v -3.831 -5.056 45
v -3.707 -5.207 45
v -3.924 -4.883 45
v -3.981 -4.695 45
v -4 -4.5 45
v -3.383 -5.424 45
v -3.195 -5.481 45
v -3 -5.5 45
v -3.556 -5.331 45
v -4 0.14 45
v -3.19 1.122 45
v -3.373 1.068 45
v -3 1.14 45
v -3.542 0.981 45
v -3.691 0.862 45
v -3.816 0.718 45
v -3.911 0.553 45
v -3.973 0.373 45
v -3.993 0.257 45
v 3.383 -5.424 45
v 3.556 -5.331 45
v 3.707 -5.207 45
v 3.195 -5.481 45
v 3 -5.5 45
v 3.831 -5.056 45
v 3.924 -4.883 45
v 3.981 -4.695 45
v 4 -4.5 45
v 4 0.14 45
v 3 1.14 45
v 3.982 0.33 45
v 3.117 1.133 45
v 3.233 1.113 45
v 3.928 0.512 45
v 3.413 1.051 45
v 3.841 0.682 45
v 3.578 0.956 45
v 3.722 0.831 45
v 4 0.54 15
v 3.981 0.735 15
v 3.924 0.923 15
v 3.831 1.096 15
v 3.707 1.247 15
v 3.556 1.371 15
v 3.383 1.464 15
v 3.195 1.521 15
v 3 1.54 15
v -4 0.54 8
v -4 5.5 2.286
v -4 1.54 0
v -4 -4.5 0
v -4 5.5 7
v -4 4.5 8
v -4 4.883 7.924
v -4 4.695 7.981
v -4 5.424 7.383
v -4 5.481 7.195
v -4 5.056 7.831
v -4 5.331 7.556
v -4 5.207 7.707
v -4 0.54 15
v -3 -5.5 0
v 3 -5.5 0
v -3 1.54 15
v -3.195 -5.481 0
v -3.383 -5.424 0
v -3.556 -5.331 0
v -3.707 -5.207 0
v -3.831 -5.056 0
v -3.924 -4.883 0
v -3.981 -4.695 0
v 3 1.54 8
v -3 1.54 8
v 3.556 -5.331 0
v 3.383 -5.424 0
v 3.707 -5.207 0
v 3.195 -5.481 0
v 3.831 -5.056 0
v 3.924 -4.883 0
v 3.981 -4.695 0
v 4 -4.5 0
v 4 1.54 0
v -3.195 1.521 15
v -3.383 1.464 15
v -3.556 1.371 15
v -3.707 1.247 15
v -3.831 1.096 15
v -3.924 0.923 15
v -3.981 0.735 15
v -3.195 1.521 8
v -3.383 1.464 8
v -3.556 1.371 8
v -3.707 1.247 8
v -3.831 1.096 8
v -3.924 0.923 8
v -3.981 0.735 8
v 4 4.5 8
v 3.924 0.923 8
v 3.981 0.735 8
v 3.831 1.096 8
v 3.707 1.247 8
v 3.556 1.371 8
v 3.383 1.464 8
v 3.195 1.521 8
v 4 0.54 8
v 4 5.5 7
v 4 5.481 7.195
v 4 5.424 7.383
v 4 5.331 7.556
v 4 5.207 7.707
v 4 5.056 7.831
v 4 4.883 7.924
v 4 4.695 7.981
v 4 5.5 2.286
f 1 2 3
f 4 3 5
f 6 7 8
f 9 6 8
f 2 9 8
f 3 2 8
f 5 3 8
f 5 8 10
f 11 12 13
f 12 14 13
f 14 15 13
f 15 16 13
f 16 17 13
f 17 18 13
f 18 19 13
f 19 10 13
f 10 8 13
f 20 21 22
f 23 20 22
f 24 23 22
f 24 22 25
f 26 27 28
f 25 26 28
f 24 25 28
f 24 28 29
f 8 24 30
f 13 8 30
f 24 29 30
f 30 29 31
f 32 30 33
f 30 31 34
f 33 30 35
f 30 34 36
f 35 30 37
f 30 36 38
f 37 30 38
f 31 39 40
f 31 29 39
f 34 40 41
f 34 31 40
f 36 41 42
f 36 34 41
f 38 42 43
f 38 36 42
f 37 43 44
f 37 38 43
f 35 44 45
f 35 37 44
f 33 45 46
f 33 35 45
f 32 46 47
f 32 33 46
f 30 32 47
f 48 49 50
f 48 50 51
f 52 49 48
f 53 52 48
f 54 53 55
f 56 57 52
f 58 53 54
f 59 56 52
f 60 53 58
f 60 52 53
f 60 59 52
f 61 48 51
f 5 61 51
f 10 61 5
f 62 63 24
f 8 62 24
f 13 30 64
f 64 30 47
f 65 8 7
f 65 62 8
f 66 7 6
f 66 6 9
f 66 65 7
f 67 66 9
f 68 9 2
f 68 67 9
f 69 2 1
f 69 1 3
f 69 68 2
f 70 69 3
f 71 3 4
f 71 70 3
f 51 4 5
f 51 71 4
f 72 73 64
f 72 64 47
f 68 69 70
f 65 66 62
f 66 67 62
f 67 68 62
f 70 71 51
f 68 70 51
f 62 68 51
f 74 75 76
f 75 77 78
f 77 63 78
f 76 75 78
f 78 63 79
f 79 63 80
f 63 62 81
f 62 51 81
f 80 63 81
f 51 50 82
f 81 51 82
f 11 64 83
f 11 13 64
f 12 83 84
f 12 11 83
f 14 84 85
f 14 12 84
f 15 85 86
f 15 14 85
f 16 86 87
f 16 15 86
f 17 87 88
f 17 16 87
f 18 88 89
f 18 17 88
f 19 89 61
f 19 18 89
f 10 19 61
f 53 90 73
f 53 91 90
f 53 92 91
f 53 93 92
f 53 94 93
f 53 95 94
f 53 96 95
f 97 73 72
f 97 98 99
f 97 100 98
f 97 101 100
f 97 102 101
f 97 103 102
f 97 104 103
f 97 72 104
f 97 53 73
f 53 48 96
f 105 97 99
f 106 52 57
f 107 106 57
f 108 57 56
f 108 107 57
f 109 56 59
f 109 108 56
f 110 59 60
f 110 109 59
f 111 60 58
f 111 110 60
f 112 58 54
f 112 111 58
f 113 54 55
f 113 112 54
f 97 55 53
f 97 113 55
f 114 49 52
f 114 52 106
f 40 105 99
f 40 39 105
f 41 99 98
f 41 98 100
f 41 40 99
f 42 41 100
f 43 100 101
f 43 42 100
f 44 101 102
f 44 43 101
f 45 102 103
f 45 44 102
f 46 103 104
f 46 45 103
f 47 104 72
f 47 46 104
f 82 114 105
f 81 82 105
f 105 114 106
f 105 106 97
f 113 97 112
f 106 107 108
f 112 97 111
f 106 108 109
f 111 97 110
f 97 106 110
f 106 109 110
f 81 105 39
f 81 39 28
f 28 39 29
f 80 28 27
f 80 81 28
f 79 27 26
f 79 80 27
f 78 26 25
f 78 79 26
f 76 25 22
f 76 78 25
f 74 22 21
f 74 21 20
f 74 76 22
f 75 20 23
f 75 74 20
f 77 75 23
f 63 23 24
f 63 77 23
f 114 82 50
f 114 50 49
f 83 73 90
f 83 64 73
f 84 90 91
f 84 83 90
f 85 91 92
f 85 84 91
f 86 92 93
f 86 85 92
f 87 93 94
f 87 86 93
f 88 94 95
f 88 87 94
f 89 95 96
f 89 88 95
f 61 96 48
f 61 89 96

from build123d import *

# Parameters (mm, degrees)
SKETCH1_W               = 8
SKETCH1_H               = 11
BOSS_EXTRUDE1_DEPTH     = 8
SKETCH2_W               = 8
SKETCH2_H               = 7.04
BOSS_EXTRUDE2_DEPTH     = 7
BOSS_EXTRUDE3_DEPTH     = 4
CUT_EXTRUDE_THIN1_DEPTH = 4
FILLET1_R               = 1


with BuildPart() as part:
    # Sketch1 → Boss-Extrude1 (new body)
    with BuildSketch(Plane.XY):
        Rectangle(SKETCH1_W, SKETCH1_H)
    extrude(amount=BOSS_EXTRUDE1_DEPTH)

    # Sketch2 → Boss-Extrude2 (add)
    with BuildSketch(Plane.XY.offset(8)):
        with Locations((0, -1.98)):
            Rectangle(SKETCH2_W, SKETCH2_H)
    extrude(amount=BOSS_EXTRUDE2_DEPTH)

    # Sketch3 → Boss-Extrude3 (add, symmetric)
    with BuildSketch(Plane(origin=(0, 0, 0), x_dir=(0, 0, -1), z_dir=(1, 0, 0))):
        Polygon((-15, 1.54), (-15, -5.5), (-45, -5.5), (-45, 1.14), align=None)
    extrude(amount=BOSS_EXTRUDE3_DEPTH, both=True)

    # Sketch4 → Cut-Extrude-Thin1 (cut, symmetric)
    with BuildSketch(Plane(origin=(0, 0, 0), x_dir=(0, 0, -1), z_dir=(1, 0, 0))):
        Polygon((0, 1.54), (-2.286307066, 5.5), (6.373946972, 10.5), (8.660254038, 6.54), align=None)
    extrude(amount=CUT_EXTRUDE_THIN1_DEPTH, both=True, mode=Mode.SUBTRACT)

    # Fillet1
    fillet1_edges = [part.edges().sort_by_distance(p)[0] for p in [
        (4, 1.54, 11.5),
        (-4, 1.54, 11.5),
        (-4, 1.34, 30),
        (4, 1.34, 30),
        (4, -5.5, 22.5),
        (-4, -5.5, 22.5),
        (0, 5.5, 8),
    ]]
    fillet(fillet1_edges, radius=FILLET1_R)


solid = part.part
